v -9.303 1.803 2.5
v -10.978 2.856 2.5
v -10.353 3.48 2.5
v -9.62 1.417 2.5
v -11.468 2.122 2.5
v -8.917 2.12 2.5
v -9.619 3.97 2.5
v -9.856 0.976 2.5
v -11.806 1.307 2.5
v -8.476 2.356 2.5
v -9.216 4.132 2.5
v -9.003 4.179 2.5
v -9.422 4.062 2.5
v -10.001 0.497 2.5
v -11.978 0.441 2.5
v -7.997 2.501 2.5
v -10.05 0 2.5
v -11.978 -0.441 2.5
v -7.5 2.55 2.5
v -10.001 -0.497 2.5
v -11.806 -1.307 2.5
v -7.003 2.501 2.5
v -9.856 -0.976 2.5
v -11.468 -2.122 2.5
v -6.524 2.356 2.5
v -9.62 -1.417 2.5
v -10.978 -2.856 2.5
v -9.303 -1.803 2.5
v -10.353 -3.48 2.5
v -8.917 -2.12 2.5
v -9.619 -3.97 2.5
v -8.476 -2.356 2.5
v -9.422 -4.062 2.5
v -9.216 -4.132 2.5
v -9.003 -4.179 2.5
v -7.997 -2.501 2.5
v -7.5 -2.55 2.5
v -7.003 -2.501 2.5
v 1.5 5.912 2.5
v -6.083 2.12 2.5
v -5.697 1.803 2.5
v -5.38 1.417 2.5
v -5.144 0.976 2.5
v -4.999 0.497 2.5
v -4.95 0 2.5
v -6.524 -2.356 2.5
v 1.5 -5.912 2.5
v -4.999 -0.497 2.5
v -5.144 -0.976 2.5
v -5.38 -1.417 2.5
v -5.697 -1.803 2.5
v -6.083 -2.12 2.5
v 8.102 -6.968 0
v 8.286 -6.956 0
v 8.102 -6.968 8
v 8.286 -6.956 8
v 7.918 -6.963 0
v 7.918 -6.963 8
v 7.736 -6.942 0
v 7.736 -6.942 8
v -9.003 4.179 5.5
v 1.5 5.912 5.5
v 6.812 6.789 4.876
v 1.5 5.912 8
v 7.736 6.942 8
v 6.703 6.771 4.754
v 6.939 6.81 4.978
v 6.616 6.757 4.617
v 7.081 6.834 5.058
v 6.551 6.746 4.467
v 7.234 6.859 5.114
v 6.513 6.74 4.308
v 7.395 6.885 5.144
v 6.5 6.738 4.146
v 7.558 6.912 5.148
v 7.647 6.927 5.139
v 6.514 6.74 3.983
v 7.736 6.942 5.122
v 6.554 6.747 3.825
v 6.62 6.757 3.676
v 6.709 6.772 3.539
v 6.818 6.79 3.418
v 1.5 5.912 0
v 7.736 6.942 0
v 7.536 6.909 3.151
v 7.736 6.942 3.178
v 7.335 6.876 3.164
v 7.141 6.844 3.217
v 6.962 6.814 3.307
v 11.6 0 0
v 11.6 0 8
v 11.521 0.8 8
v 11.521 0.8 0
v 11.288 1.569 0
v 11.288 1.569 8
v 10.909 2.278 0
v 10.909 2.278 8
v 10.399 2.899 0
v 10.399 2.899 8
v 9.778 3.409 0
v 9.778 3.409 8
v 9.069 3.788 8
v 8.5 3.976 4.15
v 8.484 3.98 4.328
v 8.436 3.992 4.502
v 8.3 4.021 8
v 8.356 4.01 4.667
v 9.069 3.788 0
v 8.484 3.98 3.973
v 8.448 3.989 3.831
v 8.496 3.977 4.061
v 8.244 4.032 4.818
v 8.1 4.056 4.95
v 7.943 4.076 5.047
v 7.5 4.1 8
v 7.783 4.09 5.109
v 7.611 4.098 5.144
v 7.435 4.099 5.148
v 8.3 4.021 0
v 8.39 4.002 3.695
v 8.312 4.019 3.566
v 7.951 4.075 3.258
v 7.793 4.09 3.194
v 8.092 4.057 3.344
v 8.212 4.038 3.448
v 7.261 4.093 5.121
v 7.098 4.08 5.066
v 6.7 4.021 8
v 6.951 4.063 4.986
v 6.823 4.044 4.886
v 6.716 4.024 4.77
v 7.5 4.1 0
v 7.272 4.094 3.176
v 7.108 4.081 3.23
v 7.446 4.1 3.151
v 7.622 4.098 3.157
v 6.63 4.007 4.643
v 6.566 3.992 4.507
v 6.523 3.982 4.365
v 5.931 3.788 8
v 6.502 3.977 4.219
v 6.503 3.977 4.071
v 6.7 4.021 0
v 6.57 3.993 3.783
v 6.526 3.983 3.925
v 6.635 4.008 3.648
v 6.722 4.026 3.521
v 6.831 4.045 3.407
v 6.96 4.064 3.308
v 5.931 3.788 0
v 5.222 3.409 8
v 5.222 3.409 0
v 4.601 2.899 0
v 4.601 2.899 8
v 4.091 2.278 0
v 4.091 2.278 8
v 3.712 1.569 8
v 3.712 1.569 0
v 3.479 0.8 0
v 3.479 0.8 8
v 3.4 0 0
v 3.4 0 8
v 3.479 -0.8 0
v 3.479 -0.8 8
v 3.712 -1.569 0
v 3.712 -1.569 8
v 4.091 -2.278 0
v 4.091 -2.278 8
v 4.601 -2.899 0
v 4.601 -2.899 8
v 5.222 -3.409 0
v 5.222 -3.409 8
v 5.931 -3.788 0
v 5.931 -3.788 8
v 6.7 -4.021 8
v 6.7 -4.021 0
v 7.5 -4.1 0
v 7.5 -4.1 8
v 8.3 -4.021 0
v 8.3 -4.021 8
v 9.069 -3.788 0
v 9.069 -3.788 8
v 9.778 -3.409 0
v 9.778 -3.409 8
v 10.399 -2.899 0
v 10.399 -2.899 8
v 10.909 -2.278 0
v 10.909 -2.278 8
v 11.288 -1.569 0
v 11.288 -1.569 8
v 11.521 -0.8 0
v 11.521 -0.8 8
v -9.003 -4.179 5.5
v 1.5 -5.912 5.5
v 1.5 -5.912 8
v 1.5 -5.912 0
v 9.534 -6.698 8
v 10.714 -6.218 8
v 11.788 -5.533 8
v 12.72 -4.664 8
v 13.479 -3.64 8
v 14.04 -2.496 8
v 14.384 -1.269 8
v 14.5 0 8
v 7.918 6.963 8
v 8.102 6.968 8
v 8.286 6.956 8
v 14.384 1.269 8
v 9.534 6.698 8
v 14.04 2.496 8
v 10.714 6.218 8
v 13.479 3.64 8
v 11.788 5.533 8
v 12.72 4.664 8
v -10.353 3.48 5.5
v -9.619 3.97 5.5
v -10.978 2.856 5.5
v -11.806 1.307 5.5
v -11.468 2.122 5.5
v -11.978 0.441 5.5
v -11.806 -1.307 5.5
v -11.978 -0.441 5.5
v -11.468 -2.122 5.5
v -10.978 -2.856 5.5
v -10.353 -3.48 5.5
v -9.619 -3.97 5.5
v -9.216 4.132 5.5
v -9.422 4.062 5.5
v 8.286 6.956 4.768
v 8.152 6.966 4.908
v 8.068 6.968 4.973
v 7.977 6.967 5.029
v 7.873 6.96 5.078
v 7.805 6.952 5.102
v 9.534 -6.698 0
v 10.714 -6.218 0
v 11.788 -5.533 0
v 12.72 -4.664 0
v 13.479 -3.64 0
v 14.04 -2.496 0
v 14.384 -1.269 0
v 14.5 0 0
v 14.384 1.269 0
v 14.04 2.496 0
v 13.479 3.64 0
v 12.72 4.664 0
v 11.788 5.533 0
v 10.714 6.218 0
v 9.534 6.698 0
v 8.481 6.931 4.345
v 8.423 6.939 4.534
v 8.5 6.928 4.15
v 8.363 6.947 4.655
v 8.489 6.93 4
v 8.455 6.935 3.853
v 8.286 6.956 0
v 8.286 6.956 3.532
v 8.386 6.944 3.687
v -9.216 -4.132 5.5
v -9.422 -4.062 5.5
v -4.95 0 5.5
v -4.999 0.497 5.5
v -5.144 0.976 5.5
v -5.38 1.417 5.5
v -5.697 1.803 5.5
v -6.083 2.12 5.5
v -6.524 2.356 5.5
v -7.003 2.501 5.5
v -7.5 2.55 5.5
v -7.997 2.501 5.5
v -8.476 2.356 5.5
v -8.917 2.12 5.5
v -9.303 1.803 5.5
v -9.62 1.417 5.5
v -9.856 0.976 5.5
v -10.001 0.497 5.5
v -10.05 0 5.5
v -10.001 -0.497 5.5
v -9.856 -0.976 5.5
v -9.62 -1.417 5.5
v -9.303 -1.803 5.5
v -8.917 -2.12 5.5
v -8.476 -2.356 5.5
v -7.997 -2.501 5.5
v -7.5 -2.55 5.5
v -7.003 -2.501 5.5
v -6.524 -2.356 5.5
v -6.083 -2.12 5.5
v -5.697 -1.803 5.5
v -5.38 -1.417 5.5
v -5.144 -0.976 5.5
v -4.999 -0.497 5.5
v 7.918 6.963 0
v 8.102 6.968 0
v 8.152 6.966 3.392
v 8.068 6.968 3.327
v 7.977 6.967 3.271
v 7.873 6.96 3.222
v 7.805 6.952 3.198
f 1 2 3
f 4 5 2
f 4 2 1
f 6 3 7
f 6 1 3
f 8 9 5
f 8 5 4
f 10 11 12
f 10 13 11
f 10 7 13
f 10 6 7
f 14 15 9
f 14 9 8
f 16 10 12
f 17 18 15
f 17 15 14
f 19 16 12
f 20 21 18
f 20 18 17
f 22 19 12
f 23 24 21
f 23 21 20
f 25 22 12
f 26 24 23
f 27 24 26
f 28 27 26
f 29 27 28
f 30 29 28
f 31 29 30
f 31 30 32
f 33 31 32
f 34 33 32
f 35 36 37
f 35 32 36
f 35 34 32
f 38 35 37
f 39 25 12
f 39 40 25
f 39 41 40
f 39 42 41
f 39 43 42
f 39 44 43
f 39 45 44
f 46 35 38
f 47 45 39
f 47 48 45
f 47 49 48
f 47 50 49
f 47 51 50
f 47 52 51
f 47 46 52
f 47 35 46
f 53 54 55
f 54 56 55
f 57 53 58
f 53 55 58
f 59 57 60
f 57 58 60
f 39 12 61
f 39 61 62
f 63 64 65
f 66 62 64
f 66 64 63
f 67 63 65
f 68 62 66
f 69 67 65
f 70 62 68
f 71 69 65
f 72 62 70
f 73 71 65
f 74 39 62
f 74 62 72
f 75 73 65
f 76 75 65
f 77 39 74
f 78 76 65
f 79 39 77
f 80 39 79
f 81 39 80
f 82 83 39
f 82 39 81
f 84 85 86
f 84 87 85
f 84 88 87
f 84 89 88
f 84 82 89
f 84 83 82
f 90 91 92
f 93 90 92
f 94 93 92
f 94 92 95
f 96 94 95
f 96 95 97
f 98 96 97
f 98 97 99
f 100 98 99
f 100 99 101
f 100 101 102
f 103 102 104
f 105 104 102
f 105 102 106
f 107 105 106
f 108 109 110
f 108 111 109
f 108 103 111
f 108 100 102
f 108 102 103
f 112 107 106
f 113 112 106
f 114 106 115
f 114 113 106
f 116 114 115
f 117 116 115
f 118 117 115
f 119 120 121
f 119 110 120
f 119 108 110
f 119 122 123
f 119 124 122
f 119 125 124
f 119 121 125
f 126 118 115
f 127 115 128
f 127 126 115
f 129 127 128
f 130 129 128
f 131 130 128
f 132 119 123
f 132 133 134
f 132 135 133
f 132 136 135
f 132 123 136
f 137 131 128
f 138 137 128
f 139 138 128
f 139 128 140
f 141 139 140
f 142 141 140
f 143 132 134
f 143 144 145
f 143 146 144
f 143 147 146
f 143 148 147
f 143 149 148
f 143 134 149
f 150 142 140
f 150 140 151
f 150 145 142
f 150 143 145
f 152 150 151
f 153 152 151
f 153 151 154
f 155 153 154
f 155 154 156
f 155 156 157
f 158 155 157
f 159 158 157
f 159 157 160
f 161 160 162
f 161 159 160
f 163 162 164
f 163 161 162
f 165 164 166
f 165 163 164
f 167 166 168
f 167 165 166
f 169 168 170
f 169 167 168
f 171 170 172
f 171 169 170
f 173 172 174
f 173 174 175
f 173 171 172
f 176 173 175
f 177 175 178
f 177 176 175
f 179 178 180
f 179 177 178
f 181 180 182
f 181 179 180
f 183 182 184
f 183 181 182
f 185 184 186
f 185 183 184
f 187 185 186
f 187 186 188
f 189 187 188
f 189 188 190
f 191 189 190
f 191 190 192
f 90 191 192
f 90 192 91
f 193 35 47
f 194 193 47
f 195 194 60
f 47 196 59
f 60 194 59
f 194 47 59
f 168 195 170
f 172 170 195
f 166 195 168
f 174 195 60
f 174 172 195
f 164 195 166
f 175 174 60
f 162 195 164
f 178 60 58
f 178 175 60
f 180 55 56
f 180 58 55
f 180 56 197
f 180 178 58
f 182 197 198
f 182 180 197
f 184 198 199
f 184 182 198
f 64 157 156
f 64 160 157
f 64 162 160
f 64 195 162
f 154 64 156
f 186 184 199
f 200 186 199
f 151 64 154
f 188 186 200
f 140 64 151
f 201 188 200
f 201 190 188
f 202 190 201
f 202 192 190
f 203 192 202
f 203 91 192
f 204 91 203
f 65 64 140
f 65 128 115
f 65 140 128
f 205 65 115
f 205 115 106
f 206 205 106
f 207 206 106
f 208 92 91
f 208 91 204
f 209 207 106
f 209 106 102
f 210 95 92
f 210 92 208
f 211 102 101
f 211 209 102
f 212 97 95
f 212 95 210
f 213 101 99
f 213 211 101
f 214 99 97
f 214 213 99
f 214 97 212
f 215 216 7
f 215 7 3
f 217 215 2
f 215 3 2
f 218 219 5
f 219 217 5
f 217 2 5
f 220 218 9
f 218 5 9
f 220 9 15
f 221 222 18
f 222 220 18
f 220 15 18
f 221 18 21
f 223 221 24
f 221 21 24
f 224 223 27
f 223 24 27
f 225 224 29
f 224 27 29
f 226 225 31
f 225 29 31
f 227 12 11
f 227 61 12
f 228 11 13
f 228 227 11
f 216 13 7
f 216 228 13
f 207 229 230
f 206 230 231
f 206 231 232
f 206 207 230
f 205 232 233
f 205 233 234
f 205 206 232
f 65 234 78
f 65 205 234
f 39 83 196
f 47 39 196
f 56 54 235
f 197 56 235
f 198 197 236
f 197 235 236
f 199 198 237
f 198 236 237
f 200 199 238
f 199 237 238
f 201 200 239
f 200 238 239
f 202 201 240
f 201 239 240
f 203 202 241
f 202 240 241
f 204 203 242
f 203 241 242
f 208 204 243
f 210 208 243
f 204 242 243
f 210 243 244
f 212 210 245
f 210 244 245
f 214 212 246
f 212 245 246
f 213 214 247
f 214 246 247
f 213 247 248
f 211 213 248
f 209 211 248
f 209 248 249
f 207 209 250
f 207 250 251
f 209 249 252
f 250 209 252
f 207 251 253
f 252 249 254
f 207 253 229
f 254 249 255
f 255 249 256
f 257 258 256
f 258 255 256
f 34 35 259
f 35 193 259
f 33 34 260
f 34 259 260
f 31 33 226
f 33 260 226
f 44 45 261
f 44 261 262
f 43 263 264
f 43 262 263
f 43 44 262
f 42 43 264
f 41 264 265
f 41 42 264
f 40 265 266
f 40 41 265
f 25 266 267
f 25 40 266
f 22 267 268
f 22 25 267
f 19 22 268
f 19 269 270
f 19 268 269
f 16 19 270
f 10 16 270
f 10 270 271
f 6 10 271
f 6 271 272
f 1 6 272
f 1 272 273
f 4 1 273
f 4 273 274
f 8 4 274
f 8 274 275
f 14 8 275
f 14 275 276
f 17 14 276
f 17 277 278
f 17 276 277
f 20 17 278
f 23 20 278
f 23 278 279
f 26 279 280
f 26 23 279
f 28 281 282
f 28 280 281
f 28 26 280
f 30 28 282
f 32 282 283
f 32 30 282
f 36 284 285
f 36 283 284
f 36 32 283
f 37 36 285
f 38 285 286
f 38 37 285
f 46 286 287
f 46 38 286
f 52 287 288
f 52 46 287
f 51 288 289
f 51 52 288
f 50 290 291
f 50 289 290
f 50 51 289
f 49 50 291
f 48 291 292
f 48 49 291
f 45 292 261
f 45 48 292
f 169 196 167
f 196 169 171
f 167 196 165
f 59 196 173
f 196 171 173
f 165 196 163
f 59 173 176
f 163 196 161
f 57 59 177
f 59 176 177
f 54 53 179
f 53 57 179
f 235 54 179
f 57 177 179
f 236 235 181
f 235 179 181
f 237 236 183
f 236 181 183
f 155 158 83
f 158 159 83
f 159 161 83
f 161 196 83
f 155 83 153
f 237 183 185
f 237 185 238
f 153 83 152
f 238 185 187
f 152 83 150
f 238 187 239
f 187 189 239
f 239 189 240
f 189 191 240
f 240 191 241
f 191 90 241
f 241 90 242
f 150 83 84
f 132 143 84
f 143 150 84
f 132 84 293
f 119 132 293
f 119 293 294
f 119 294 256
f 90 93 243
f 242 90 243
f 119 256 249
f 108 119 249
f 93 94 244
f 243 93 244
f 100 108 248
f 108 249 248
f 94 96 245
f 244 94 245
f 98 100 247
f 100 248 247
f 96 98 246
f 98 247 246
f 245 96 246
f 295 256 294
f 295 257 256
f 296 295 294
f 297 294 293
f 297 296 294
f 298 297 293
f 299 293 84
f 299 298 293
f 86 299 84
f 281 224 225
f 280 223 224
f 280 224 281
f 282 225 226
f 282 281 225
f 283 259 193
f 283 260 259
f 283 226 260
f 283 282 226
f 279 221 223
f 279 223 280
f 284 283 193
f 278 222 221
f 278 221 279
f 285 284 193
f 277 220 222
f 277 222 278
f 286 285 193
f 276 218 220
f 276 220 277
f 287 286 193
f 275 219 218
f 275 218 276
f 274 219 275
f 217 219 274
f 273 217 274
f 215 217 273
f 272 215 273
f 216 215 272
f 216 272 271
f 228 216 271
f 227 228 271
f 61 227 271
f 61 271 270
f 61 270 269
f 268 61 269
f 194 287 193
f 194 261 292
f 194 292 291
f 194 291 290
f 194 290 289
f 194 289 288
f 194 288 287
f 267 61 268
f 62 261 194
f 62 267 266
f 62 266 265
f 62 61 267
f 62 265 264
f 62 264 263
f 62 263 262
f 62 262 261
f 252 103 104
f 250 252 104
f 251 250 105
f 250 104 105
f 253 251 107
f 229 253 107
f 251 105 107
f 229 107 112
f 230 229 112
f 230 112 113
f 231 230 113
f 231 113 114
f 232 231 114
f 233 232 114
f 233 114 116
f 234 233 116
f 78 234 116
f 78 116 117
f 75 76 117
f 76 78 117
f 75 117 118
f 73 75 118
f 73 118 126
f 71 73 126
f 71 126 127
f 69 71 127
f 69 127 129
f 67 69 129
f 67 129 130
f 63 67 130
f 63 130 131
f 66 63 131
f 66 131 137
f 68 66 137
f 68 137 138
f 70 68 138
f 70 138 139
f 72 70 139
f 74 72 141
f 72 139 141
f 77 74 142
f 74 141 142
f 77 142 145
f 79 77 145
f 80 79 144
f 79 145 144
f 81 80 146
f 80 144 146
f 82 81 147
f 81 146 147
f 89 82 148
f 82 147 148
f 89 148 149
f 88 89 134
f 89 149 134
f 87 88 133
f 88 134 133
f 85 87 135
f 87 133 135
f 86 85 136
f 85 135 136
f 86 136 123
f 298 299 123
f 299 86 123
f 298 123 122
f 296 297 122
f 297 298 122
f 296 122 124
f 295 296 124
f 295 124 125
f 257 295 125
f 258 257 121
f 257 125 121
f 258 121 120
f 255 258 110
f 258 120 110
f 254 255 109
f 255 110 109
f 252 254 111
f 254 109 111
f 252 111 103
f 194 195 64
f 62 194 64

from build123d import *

# Parameters (mm, degrees)
SKETCH_R        = 4.1
SKETCH_R_2      = 2.55
PAD_DEPTH       = 8
SKETCH001_W     = 15
SKETCH001_H     = 15
POCKET_DEPTH    = 2.5
SKETCH002_W     = 15
SKETCH002_H     = 15
POCKET001_DEPTH = 2.5
SKETCH003_R     = 1
POCKET002_DEPTH = 7
FILLET_R        = 2


with BuildPart() as part:
    # Sketch → Pad (new body)
    with BuildSketch(Plane.XY):
        with BuildLine():
            ThreePointArc((7.986353, -6.983084), (14.5, 0), (7.986353, 6.983084))
            Line((-9.28, 4.132989), (7.986353, 6.983084))
            ThreePointArc((-9.28, 4.132989), (-12, 0), (-9.28, -4.132989))
            Line((-9.28, -4.132989), (7.986353, -6.983084))
        make_face()
        with Locations((7.5, 0)):
            Circle(SKETCH_R, mode=Mode.SUBTRACT)
        with Locations((-7.5, 0)):
            Circle(SKETCH_R_2, mode=Mode.SUBTRACT)
    extrude(amount=PAD_DEPTH)

    # Sketch001 (on Face8 of Pad) → Pocket (cut)
    with BuildSketch(Plane.XY.offset(8)):
        with Locations((-6, 0)):
            Rectangle(SKETCH001_W, SKETCH001_H)
    extrude(amount=-POCKET_DEPTH, mode=Mode.SUBTRACT)

    # Sketch002 (on Face4 of Pocket) → Pocket001 (cut)
    with BuildSketch(Plane(origin=(0, 0, 0), x_dir=(1, 0, 0), z_dir=(0, 0, -1))):
        with Locations((-6, 0)):
            Rectangle(SKETCH002_W, SKETCH002_H)
    extrude(amount=-POCKET001_DEPTH, mode=Mode.SUBTRACT)

    # Sketch003 → Pocket002 (cut)
    with BuildSketch(Plane.XZ):
        with Locations((7.5, 4.15)):
            Circle(SKETCH003_R)
    extrude(amount=-POCKET002_DEPTH, mode=Mode.SUBTRACT)

    # Fillet
    fillet_edges = [part.edges().sort_by_distance(p)[0] for p in [
        (-9.28, 4.132989, 4),
        (7.986353, 6.983084, 6.511881),
        (7.986353, 6.983084, 1.638119),
        (7.986353, -6.983084, 4),
        (-9.28, -4.132989, 4),
    ]]
    fillet(fillet_edges, radius=FILLET_R)


solid = part.part
